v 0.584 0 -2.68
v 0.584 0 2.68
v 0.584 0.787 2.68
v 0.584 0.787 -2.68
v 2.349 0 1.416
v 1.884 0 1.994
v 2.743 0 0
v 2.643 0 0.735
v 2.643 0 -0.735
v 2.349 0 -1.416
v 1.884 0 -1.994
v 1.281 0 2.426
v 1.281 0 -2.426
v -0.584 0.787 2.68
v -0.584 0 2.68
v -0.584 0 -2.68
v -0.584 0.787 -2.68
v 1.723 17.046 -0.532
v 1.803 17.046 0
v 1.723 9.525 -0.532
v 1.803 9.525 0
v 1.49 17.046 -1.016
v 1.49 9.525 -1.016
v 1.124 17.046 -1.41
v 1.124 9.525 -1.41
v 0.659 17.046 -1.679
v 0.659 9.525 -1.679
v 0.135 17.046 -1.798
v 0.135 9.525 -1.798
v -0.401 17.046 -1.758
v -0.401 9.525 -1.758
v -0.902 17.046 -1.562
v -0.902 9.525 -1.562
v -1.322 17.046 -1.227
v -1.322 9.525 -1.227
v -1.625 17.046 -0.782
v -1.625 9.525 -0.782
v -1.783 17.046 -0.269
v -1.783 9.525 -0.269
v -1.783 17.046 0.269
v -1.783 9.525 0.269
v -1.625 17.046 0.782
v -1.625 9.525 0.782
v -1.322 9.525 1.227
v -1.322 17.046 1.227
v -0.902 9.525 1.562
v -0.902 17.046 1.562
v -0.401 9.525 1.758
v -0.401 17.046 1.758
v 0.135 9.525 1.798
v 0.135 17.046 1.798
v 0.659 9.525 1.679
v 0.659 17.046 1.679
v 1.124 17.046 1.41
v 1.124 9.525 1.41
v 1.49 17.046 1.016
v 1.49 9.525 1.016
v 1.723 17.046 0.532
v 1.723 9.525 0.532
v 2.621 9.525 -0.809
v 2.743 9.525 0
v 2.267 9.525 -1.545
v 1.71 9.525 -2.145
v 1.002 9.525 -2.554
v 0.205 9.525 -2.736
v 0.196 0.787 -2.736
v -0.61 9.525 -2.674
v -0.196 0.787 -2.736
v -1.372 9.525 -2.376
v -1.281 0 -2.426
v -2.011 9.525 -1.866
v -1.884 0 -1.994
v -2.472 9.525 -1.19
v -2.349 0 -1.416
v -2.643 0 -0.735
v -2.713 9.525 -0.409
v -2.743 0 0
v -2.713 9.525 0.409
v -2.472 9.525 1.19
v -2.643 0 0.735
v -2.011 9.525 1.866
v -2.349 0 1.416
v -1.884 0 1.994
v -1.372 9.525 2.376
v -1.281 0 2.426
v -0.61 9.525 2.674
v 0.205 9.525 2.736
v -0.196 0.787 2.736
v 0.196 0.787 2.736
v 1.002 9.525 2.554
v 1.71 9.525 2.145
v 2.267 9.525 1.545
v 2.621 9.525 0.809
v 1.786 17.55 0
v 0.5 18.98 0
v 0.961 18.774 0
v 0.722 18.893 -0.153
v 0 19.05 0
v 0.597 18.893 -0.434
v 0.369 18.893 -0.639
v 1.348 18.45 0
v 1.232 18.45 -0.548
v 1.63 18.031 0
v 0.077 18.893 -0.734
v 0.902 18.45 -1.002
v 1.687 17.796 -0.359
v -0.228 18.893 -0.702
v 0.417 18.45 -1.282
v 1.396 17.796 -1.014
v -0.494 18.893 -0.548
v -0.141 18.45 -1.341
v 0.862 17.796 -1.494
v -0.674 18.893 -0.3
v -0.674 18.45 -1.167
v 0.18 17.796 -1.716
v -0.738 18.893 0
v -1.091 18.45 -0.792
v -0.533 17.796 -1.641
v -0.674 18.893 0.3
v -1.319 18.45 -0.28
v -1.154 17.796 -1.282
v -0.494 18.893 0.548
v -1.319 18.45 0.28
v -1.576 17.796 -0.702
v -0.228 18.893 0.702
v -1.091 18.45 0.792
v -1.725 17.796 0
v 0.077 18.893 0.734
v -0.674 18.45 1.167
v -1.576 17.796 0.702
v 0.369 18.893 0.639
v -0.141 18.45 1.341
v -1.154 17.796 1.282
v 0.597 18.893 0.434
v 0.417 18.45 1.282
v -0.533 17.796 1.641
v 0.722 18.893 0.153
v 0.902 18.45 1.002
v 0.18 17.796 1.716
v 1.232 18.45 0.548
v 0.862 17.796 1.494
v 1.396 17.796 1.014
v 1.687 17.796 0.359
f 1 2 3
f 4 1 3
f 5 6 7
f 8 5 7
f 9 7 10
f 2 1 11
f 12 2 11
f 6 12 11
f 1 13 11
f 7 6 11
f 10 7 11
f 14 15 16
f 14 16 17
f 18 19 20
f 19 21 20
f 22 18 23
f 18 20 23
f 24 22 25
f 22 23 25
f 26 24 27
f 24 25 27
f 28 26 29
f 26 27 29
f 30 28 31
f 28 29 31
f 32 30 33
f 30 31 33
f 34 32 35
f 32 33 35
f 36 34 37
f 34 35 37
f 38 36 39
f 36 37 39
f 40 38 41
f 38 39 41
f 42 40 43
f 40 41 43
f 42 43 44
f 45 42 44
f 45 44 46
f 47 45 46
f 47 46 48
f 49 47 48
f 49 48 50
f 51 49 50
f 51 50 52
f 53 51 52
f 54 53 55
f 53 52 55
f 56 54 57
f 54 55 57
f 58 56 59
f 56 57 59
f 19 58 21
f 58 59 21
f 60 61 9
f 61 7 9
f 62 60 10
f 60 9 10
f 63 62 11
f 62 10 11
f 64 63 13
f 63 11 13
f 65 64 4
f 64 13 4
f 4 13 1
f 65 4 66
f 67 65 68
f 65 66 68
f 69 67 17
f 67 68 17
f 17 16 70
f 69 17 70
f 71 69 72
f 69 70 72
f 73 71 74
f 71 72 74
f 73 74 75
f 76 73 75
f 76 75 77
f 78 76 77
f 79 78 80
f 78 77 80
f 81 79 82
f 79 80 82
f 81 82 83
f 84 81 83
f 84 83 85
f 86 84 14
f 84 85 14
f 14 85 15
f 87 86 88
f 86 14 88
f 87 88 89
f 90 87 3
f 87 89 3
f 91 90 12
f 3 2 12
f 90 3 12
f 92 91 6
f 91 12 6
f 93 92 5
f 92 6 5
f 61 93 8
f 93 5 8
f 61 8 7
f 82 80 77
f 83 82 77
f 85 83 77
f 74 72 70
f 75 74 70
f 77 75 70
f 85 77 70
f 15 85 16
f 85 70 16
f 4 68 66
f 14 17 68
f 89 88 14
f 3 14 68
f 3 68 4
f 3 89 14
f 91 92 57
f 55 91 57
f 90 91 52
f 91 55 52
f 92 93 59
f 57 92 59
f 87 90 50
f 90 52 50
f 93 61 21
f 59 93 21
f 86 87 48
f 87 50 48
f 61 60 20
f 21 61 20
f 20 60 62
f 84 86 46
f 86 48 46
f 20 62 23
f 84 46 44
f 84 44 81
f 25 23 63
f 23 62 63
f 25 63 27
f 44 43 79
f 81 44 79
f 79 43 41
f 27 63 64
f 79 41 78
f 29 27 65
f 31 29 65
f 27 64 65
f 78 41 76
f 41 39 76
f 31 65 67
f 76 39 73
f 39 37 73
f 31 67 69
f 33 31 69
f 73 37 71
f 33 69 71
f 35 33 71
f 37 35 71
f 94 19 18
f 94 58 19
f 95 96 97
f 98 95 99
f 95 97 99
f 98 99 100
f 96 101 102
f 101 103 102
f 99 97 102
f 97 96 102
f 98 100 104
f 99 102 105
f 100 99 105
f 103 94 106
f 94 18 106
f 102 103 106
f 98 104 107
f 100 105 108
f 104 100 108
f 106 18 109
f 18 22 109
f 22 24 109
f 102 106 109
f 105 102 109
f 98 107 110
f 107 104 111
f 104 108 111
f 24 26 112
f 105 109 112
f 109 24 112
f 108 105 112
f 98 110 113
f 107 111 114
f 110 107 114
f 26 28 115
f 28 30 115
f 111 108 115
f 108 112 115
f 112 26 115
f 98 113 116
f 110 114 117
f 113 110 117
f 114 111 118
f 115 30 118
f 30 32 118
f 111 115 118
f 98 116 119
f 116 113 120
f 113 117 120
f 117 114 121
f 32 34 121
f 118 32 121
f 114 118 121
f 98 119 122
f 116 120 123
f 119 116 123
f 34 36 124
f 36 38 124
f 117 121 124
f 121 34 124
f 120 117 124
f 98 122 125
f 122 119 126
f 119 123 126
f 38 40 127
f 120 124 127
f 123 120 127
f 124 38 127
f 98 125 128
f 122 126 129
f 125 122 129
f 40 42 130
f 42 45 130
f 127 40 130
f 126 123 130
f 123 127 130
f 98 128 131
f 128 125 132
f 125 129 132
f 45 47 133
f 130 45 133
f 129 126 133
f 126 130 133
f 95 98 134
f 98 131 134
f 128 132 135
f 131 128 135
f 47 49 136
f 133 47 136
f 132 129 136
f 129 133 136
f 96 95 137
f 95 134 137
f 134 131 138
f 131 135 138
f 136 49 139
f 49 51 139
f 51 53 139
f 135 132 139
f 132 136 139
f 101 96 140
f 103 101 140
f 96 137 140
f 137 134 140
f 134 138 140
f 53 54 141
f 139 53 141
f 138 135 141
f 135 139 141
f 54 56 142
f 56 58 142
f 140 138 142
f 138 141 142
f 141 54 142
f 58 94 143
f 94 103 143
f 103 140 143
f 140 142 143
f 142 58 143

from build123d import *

# Parameters (mm, degrees)
SKETCH2_W               = 1.1684
SKETCH2_H               = 0.7874
CUT_EXTRUDE1_DEPTH      = 3.7432
CUT_EXTRUDE1_DEPTH_BACK = 3.7432


with BuildPart() as part:
    # Sketch1 → Revolve1 (revolve)
    with BuildSketch(Plane.XY):
        with BuildLine():
            Line((0, 0), (0, 19.05))
            ThreePointArc((0, 19.05), (1.348059913, 18.449540529), (1.8034, 17.045801767))
            Line((1.8034, 17.045801767), (1.8034, 9.525))
            Line((1.8034, 9.525), (2.7432, 9.525))
            Line((2.7432, 9.525), (2.7432, 0))
            Line((2.7432, 0), (0, 0))
        make_face()
    revolve(axis=Axis((0, 0, 0), (0, 1, 0)))

    # Sketch2 → Cut-Extrude1 (cut, two sides)
    with BuildSketch(Plane.XY) as cut_extrude1_sk:
        with Locations((0, 0.3937)):
            Rectangle(SKETCH2_W, SKETCH2_H)
    extrude(amount=CUT_EXTRUDE1_DEPTH, mode=Mode.SUBTRACT)
    extrude(cut_extrude1_sk.sketch, amount=-CUT_EXTRUDE1_DEPTH_BACK, mode=Mode.SUBTRACT)


solid = part.part
